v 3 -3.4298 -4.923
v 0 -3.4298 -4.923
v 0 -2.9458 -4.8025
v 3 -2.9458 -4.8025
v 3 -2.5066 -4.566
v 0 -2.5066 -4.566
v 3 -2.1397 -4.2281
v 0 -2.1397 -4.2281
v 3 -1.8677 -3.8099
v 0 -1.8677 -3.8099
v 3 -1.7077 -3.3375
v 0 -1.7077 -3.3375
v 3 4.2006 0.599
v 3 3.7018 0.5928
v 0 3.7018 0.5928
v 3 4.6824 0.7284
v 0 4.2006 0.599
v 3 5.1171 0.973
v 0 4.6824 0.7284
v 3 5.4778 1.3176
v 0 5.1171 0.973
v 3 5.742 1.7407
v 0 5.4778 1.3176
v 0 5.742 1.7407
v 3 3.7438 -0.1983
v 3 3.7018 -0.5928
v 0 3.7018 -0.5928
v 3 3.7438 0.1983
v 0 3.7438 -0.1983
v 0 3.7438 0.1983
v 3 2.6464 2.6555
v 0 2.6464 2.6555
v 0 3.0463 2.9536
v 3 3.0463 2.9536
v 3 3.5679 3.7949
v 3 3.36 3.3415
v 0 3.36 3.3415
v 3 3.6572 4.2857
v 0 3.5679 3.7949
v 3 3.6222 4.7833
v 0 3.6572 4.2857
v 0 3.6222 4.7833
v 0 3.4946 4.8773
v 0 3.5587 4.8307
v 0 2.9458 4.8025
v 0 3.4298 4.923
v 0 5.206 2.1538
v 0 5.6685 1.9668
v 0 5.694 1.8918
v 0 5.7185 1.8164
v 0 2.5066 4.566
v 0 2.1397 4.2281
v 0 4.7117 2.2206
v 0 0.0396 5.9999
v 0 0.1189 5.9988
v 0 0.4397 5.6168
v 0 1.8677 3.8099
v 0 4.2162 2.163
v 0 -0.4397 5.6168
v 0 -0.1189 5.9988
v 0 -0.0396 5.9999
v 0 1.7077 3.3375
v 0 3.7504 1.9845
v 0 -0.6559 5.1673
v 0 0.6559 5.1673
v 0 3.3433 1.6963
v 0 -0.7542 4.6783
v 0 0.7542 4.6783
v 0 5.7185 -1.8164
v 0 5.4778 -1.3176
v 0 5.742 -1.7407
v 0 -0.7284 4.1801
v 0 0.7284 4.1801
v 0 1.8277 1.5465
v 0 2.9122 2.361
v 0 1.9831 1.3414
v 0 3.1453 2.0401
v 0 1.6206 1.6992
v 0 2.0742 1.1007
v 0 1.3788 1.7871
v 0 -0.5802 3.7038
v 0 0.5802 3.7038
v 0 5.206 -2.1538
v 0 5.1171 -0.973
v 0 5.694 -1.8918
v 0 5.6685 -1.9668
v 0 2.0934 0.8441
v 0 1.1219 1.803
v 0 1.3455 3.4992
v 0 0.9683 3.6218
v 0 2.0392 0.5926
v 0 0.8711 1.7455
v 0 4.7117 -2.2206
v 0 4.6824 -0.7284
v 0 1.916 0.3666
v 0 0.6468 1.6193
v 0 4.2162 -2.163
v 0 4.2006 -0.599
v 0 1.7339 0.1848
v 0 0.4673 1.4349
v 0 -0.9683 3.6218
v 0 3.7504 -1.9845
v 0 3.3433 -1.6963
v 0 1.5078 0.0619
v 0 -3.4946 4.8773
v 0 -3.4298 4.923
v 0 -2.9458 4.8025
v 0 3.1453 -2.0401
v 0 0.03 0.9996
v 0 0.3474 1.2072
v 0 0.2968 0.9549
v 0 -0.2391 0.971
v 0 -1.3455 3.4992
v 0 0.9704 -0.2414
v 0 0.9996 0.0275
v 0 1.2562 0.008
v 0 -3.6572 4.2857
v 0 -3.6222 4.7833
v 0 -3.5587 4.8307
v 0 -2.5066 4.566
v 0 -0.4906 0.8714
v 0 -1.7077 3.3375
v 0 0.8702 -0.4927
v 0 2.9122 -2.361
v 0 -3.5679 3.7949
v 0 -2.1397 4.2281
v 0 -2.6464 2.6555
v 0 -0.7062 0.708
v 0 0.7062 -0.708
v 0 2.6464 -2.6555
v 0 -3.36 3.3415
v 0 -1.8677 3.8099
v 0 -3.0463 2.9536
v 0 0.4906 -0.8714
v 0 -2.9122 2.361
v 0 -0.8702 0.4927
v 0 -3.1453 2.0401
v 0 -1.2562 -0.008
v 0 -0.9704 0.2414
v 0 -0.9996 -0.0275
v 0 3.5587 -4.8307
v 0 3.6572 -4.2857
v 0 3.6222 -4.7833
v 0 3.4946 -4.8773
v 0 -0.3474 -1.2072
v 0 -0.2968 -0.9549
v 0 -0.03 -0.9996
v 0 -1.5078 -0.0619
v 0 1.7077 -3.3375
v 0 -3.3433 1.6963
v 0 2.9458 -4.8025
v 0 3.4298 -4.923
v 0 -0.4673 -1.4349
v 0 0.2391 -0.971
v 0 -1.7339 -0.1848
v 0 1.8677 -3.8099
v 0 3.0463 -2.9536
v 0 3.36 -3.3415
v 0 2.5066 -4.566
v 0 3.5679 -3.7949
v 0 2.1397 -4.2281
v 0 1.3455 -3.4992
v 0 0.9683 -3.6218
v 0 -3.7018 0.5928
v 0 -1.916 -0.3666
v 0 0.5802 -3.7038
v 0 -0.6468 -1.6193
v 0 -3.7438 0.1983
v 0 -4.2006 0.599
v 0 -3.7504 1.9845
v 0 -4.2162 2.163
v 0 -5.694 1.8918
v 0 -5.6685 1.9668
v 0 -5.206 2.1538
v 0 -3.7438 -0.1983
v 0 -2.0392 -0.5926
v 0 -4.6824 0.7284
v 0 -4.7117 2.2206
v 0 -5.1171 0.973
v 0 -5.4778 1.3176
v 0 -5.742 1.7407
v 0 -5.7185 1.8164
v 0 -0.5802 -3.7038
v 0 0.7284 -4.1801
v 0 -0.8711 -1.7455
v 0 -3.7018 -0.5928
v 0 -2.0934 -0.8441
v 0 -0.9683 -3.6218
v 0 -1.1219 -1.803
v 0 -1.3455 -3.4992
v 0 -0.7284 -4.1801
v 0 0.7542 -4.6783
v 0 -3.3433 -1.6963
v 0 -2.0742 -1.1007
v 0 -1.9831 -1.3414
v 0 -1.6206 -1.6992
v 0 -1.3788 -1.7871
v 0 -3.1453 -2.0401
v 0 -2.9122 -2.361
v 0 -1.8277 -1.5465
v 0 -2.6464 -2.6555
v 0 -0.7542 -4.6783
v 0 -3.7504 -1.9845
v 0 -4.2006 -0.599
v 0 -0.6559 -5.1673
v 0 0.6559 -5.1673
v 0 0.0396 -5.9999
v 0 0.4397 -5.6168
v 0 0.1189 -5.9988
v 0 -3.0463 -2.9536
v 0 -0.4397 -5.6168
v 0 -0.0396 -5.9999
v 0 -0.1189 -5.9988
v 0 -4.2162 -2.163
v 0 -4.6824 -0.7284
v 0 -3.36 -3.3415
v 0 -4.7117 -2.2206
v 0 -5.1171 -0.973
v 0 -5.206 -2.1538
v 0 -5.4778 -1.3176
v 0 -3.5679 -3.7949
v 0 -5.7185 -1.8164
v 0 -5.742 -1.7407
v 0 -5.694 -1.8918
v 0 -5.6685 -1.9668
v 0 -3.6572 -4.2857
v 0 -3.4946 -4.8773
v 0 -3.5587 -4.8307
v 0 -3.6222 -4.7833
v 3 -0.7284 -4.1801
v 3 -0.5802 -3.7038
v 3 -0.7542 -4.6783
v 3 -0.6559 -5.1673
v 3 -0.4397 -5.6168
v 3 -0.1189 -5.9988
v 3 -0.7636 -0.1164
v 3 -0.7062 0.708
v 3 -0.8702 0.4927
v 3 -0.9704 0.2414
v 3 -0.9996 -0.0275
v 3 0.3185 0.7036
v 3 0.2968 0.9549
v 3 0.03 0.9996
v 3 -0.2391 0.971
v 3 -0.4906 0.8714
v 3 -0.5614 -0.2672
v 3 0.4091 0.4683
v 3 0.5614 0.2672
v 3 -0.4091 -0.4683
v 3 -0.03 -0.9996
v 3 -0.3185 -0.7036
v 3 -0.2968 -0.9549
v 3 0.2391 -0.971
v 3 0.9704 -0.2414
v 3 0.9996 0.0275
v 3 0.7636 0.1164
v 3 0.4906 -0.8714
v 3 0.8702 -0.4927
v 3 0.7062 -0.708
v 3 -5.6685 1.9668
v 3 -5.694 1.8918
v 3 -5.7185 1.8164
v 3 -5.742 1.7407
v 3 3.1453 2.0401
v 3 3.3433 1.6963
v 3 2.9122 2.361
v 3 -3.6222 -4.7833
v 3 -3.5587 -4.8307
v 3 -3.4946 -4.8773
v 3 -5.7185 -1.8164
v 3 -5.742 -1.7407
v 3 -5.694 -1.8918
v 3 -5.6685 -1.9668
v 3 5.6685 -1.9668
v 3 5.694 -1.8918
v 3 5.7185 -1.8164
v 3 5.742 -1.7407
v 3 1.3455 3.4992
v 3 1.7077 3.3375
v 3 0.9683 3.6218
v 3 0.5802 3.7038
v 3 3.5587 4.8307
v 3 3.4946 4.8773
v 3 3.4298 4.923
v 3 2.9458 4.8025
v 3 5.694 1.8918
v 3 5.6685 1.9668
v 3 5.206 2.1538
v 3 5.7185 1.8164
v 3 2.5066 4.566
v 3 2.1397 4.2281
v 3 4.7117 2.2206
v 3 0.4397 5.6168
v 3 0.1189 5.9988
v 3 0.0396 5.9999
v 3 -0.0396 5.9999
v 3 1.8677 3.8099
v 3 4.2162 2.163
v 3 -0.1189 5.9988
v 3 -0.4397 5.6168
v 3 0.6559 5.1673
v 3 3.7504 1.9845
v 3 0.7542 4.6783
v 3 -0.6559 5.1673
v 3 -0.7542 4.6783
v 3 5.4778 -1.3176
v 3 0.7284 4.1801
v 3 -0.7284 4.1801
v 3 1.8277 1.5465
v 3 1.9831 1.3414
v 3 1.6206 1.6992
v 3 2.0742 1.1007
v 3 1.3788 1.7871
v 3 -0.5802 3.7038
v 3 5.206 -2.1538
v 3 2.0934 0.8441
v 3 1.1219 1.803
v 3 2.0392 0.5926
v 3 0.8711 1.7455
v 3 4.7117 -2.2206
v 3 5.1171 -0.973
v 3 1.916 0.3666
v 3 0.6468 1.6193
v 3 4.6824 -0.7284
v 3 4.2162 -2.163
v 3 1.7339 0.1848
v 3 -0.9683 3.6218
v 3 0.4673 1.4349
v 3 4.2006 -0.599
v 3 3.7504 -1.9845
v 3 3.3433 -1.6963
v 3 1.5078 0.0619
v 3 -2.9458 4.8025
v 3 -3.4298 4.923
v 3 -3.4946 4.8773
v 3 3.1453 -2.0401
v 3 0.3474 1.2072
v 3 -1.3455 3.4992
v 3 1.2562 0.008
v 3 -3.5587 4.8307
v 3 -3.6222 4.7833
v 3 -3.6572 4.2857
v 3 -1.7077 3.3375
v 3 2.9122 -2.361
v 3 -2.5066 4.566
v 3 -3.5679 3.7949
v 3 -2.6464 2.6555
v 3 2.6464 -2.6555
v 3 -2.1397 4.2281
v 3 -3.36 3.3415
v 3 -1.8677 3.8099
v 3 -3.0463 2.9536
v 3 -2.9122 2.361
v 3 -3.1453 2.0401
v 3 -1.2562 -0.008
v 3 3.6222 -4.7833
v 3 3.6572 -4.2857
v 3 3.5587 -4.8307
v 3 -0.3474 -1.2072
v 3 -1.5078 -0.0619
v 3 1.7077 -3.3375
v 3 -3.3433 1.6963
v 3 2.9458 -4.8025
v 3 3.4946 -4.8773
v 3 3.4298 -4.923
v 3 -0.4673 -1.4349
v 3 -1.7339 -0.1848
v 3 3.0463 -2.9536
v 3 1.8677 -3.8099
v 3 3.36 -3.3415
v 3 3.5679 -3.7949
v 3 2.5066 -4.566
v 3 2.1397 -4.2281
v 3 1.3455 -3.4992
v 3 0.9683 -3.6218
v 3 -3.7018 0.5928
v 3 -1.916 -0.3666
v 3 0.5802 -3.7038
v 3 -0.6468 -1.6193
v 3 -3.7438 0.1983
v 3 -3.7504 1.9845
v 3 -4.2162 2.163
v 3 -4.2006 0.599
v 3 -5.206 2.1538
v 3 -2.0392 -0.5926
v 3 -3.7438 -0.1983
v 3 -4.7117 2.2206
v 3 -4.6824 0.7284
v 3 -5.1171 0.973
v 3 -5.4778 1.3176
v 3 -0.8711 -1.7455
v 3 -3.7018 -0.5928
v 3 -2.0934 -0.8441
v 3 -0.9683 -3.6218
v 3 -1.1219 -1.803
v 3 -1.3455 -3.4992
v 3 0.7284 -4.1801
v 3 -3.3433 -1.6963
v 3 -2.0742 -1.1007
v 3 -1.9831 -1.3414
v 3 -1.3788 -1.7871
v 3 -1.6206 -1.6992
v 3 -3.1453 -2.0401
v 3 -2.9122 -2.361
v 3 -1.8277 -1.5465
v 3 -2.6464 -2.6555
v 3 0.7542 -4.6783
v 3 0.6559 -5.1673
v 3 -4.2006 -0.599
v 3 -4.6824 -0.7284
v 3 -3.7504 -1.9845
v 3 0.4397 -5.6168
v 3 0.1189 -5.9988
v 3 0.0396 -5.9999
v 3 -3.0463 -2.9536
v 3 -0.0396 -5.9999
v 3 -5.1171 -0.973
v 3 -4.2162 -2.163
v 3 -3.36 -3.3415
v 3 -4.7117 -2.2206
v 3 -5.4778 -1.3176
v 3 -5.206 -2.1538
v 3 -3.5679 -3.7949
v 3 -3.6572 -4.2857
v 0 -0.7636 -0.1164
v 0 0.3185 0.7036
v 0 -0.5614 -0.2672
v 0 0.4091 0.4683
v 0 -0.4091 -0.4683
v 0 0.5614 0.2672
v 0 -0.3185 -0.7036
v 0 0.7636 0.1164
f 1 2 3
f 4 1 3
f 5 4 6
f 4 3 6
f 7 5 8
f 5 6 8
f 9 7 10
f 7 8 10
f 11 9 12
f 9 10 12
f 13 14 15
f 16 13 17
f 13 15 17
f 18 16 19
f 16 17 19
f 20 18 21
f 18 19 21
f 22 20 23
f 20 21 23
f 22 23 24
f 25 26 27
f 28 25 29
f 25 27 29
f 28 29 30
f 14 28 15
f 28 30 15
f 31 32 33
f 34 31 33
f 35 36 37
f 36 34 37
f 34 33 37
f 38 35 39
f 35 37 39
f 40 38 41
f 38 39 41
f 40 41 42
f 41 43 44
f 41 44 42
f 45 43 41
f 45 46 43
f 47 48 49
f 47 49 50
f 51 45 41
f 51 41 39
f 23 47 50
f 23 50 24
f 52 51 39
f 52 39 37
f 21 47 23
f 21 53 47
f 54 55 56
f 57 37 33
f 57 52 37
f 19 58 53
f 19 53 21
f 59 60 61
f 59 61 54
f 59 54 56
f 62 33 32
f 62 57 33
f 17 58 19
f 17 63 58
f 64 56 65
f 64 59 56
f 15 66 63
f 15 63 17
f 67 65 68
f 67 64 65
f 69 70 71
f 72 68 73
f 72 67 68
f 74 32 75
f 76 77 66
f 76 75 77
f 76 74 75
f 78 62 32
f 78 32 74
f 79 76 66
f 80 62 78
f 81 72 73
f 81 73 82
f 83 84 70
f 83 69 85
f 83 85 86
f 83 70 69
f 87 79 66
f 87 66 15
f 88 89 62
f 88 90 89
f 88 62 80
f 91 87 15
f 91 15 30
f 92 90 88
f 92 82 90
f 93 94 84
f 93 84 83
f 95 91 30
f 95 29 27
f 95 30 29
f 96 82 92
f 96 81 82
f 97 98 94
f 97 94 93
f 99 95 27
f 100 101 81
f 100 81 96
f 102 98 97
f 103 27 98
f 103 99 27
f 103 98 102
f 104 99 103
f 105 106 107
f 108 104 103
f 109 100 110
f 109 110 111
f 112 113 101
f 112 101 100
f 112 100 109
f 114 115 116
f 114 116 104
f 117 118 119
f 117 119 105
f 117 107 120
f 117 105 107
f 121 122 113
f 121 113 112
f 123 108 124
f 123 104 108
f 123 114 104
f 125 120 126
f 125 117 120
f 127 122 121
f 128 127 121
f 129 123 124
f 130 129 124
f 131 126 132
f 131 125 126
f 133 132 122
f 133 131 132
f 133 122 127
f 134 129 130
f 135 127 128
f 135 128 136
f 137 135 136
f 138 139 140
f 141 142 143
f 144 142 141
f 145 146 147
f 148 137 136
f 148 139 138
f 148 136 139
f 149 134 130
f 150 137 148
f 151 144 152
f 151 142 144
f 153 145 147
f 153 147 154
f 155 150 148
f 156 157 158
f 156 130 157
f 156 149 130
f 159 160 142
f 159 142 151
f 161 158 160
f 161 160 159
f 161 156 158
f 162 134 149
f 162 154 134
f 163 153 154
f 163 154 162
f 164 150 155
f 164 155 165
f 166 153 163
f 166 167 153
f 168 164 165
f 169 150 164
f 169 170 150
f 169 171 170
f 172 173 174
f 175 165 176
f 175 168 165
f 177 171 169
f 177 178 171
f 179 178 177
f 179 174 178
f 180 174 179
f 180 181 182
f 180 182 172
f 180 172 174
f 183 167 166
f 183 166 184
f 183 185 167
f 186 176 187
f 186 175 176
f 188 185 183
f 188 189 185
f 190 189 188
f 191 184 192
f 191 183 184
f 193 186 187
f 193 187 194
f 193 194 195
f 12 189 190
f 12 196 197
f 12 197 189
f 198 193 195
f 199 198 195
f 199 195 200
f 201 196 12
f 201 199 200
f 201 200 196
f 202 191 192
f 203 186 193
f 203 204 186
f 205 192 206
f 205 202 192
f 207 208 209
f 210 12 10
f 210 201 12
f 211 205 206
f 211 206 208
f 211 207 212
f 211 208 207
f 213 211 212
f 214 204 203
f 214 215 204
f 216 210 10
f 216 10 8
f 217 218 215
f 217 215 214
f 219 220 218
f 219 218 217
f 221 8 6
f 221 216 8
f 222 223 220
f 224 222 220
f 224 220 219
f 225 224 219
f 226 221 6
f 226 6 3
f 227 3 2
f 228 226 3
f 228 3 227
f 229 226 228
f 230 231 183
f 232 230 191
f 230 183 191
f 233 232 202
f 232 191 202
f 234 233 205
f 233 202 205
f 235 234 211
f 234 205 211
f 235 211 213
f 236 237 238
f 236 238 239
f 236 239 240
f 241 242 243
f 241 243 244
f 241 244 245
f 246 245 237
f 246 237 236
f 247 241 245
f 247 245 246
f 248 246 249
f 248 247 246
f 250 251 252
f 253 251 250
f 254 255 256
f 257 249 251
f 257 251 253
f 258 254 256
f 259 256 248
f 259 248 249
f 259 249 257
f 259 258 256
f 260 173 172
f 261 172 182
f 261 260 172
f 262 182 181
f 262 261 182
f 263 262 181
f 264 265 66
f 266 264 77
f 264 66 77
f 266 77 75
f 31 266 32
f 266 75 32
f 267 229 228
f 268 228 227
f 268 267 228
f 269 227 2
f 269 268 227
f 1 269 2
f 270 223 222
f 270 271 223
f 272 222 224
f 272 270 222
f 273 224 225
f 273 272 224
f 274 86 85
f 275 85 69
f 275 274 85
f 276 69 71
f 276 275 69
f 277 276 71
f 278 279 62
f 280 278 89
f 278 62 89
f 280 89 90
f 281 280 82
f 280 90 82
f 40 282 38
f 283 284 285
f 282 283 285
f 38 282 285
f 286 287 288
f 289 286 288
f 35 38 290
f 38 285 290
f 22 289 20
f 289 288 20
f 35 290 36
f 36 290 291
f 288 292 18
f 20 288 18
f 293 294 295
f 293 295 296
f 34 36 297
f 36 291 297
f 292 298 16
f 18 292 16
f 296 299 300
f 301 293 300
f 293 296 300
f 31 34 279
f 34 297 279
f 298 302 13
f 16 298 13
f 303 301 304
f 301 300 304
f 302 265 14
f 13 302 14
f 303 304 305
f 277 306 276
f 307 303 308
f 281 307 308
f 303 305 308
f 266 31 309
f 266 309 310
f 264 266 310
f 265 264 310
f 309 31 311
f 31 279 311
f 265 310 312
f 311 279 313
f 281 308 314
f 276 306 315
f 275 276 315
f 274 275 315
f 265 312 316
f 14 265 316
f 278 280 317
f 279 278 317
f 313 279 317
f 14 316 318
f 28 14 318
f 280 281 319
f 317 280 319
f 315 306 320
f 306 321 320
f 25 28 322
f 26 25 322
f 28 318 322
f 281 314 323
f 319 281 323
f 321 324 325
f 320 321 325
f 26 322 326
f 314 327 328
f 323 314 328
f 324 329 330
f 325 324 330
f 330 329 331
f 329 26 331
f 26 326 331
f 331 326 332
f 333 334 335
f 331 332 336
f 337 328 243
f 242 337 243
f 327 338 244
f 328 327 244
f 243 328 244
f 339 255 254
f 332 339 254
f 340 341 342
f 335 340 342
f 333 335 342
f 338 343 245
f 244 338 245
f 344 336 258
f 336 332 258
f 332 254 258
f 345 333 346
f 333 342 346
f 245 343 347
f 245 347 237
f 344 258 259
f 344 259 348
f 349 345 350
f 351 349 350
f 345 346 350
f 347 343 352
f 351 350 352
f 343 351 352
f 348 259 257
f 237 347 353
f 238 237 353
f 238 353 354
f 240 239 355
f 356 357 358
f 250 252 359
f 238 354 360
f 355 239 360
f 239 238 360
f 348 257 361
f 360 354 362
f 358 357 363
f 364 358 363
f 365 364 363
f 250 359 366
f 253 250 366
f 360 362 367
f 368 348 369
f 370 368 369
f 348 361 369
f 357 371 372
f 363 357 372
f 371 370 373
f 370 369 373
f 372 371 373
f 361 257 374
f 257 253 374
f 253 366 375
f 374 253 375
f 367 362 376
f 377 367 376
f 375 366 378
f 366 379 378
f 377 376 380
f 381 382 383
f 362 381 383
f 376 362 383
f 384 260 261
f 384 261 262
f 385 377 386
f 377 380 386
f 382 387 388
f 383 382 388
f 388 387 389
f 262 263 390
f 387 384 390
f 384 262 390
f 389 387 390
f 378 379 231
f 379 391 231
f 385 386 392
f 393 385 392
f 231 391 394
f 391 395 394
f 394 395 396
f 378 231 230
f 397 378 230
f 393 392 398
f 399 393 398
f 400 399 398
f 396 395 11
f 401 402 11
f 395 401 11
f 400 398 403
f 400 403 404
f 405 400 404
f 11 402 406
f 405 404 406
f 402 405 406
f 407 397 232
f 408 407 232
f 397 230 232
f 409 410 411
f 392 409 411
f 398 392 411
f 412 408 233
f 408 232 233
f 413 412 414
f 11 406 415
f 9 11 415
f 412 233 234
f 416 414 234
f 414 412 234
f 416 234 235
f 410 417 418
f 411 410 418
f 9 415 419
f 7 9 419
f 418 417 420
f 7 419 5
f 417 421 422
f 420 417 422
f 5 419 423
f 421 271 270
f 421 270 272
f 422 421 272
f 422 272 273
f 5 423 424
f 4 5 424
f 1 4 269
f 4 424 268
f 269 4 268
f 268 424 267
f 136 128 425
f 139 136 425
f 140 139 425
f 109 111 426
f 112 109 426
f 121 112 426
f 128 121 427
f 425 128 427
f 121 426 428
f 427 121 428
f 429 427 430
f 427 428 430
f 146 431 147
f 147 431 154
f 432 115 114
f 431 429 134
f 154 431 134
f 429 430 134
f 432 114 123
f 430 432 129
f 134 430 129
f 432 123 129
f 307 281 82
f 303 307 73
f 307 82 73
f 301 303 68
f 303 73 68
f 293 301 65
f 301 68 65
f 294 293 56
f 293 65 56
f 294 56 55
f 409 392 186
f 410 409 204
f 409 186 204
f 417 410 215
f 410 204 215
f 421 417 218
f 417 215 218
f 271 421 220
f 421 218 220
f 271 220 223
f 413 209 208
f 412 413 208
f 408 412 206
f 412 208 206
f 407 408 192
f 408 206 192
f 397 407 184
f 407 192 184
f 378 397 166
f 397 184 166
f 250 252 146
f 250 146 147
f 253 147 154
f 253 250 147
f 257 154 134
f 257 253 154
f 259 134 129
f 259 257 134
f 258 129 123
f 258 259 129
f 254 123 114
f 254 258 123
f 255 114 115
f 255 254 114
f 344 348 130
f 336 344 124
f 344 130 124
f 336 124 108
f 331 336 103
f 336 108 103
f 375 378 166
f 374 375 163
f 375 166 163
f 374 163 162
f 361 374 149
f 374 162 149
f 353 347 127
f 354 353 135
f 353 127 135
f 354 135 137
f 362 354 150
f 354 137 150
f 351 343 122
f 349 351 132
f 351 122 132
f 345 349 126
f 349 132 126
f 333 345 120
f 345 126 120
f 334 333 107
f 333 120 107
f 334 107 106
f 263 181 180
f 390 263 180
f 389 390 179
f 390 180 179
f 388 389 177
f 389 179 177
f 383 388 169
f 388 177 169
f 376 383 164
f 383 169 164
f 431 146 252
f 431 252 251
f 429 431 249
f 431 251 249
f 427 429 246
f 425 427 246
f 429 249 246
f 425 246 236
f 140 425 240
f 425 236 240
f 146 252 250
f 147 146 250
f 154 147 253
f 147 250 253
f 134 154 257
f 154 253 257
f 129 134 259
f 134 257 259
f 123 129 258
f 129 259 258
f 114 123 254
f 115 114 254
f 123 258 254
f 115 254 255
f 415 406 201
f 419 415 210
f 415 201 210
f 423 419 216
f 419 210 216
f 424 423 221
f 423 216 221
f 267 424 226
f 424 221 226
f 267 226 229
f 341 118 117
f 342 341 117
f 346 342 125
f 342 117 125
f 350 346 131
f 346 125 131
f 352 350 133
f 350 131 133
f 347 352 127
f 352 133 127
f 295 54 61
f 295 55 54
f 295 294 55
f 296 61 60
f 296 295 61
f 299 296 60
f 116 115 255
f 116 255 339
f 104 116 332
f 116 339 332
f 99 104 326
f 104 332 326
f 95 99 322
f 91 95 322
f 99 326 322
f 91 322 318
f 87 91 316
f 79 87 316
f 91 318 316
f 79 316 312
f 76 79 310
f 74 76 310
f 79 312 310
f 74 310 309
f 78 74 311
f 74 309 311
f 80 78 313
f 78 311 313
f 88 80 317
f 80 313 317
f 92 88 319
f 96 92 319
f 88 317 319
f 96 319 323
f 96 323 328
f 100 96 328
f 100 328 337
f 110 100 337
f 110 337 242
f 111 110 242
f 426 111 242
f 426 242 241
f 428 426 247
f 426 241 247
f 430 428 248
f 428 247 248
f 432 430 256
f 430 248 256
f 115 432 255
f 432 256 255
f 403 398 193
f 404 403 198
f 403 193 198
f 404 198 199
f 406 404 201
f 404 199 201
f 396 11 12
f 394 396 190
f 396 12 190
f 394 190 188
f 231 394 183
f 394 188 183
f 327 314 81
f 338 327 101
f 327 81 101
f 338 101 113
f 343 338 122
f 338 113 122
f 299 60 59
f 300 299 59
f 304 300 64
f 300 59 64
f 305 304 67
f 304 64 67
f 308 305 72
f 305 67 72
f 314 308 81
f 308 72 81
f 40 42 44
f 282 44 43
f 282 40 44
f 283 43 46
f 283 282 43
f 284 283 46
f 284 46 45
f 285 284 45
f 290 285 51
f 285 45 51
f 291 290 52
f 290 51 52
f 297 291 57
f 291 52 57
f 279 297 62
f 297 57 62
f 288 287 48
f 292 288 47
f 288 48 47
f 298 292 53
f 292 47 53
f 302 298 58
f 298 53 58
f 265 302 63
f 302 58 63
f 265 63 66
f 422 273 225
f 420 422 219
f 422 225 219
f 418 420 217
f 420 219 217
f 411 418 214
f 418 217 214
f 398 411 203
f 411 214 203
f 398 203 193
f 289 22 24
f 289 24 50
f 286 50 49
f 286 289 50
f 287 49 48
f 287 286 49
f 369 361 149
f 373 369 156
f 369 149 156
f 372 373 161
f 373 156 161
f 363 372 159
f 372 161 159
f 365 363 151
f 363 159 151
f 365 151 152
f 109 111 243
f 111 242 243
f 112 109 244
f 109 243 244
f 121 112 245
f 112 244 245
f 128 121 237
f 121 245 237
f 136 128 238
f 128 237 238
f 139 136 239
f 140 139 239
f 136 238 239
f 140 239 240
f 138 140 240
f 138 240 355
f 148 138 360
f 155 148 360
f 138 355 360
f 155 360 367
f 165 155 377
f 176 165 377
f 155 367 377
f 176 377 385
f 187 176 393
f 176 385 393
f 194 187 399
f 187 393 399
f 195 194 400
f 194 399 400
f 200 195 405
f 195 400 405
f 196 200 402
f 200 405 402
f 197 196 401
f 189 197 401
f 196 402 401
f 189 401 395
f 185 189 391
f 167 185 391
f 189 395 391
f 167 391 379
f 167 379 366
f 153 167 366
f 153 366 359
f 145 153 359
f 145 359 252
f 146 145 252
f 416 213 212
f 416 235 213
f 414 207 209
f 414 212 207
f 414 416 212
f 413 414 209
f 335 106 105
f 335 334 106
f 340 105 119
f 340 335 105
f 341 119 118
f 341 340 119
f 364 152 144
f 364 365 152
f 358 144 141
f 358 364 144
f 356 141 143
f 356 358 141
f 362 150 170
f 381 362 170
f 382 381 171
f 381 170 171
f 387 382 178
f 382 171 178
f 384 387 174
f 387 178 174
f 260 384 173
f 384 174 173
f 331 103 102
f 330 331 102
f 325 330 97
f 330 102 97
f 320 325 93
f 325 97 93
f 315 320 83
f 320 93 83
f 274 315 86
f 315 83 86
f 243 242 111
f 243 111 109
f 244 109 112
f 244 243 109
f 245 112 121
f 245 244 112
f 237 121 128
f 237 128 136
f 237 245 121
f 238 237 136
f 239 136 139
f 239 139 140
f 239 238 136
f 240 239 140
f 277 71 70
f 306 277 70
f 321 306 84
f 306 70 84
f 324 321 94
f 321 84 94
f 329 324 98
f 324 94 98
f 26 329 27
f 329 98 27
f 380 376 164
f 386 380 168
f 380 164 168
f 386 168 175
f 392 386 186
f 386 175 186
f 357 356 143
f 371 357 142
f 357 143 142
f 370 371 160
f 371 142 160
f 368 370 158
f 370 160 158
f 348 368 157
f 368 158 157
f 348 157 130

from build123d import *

# Parameters (mm, degrees)
BASPROSKE_W         = 3
BASPROSKE_H         = 6
TOOTHCUT_DEPTH      = 10
TEETHCUTS_COUNT     = 10
TEETHCUTS_ANGLE     = 324
HUBNEABOTSKE_R      = 0.5
HUBNEARBOTH_DEPTH   = 23.5000254
HUBFAR_START        = 23.5000254
HUBFARSKE_R         = 0.5
HUBFAR_DEPTH        = 23.5000254
BORSKE_R            = 1
BORE_DEPTH          = 50.0000508
SKETCH1_R           = 1
BOSS_EXTRUDE1_DEPTH = 3
SKETCH2_R           = 0.9
CUT_EXTRUDE1_DEPTH  = 3


with BuildPart() as part:
    # BasProSke → Base-Revolve (revolve)
    with BuildSketch(Plane(origin=(0, 0, 0), x_dir=(1, 0, 0), z_dir=(0, 1, 0))):
        with Locations((1.5, 3)):
            Rectangle(BASPROSKE_W, BASPROSKE_H)
    revolve(axis=Axis((-10, 0, 0), (1, 0, 0)))

    # TooCutSke → ToothCut (cut, through all)
    with BuildSketch(Plane(origin=(0, 0, 0), x_dir=(0, 0, -1), z_dir=(1, 0, 0))):
        with BuildLine():
            ThreePointArc((0.59278292, 3.701838653), (0, 3.749), (-0.59278292, 3.701838653))
            ThreePointArc((-0.59278292, 3.701838653), (-0.846593509, 4.924114224), (-1.775771316, 5.757784417))
            ThreePointArc((-1.775771316, 5.757784417), (0, 6.0254), (1.775771316, 5.757784417))
            ThreePointArc((1.775771316, 5.757784417), (0.846593509, 4.924114224), (0.59278292, 3.701838653))
        make_face()
    toothcut = extrude(amount=TOOTHCUT_DEPTH, mode=Mode.SUBTRACT)

    # TeethCuts: ToothCut ×10 about axis
    teethcuts_axis = Axis((-10, 0, 0), (1, 0, 0))
    for i in range(1, TEETHCUTS_COUNT):
        add(toothcut.rotate(teethcuts_axis, i * TEETHCUTS_ANGLE / (TEETHCUTS_COUNT - 1)), mode=Mode.SUBTRACT)

    # HubNeaBotSke → HubNearBoth (add)
    with BuildSketch(Plane.ZY):
        Circle(HUBNEABOTSKE_R)
    extrude(amount=HUBNEARBOTH_DEPTH)

    # HubFarSke → HubFar (add)
    with BuildSketch(Plane(origin=(3, 0, 0), x_dir=(0, 0, -1), z_dir=(1, 0, 0)).offset(HUBFAR_START)):
        Circle(HUBFARSKE_R)
    extrude(amount=-HUBFAR_DEPTH)

    # BorSke → Bore (cut, symmetric)
    with BuildSketch(Plane(origin=(0, 0, 0), x_dir=(0, 0, -1), z_dir=(1, 0, 0))):
        Circle(BORSKE_R)
    extrude(amount=BORE_DEPTH, both=True, mode=Mode.SUBTRACT)


with BuildPart() as body_2:
    # Sketch1 → Boss-Extrude1 (new body)
    with BuildSketch(Plane(origin=(3, 0, 0), x_dir=(0, 0, -1), z_dir=(1, 0, 0))):
        Circle(SKETCH1_R)
    extrude(amount=-BOSS_EXTRUDE1_DEPTH)


with BuildPart() as cut_extrude1_tool:
    # Sketch2 → Cut-Extrude1 (new body)
    with BuildSketch(Plane(origin=(3, 0, 0), x_dir=(0, 0, -1), z_dir=(1, 0, 0))):
        with Locations((-0.905966344, 1.19550198)):
            Circle(SKETCH2_R)
        with Locations((0.905966344, -1.19550198)):
            Circle(SKETCH2_R)
    extrude(amount=-CUT_EXTRUDE1_DEPTH)


with BuildPart() as part_1:
    add(part.part)

    # Cut-Extrude1: cut by cut_extrude1_tool
    add(cut_extrude1_tool.part, mode=Mode.SUBTRACT)


with BuildPart() as body_2_1:
    add(body_2.part)

    # Cut-Extrude1: cut by cut_extrude1_tool
    add(cut_extrude1_tool.part, mode=Mode.SUBTRACT)


solid = Compound([part_1.part, body_2_1.part])
